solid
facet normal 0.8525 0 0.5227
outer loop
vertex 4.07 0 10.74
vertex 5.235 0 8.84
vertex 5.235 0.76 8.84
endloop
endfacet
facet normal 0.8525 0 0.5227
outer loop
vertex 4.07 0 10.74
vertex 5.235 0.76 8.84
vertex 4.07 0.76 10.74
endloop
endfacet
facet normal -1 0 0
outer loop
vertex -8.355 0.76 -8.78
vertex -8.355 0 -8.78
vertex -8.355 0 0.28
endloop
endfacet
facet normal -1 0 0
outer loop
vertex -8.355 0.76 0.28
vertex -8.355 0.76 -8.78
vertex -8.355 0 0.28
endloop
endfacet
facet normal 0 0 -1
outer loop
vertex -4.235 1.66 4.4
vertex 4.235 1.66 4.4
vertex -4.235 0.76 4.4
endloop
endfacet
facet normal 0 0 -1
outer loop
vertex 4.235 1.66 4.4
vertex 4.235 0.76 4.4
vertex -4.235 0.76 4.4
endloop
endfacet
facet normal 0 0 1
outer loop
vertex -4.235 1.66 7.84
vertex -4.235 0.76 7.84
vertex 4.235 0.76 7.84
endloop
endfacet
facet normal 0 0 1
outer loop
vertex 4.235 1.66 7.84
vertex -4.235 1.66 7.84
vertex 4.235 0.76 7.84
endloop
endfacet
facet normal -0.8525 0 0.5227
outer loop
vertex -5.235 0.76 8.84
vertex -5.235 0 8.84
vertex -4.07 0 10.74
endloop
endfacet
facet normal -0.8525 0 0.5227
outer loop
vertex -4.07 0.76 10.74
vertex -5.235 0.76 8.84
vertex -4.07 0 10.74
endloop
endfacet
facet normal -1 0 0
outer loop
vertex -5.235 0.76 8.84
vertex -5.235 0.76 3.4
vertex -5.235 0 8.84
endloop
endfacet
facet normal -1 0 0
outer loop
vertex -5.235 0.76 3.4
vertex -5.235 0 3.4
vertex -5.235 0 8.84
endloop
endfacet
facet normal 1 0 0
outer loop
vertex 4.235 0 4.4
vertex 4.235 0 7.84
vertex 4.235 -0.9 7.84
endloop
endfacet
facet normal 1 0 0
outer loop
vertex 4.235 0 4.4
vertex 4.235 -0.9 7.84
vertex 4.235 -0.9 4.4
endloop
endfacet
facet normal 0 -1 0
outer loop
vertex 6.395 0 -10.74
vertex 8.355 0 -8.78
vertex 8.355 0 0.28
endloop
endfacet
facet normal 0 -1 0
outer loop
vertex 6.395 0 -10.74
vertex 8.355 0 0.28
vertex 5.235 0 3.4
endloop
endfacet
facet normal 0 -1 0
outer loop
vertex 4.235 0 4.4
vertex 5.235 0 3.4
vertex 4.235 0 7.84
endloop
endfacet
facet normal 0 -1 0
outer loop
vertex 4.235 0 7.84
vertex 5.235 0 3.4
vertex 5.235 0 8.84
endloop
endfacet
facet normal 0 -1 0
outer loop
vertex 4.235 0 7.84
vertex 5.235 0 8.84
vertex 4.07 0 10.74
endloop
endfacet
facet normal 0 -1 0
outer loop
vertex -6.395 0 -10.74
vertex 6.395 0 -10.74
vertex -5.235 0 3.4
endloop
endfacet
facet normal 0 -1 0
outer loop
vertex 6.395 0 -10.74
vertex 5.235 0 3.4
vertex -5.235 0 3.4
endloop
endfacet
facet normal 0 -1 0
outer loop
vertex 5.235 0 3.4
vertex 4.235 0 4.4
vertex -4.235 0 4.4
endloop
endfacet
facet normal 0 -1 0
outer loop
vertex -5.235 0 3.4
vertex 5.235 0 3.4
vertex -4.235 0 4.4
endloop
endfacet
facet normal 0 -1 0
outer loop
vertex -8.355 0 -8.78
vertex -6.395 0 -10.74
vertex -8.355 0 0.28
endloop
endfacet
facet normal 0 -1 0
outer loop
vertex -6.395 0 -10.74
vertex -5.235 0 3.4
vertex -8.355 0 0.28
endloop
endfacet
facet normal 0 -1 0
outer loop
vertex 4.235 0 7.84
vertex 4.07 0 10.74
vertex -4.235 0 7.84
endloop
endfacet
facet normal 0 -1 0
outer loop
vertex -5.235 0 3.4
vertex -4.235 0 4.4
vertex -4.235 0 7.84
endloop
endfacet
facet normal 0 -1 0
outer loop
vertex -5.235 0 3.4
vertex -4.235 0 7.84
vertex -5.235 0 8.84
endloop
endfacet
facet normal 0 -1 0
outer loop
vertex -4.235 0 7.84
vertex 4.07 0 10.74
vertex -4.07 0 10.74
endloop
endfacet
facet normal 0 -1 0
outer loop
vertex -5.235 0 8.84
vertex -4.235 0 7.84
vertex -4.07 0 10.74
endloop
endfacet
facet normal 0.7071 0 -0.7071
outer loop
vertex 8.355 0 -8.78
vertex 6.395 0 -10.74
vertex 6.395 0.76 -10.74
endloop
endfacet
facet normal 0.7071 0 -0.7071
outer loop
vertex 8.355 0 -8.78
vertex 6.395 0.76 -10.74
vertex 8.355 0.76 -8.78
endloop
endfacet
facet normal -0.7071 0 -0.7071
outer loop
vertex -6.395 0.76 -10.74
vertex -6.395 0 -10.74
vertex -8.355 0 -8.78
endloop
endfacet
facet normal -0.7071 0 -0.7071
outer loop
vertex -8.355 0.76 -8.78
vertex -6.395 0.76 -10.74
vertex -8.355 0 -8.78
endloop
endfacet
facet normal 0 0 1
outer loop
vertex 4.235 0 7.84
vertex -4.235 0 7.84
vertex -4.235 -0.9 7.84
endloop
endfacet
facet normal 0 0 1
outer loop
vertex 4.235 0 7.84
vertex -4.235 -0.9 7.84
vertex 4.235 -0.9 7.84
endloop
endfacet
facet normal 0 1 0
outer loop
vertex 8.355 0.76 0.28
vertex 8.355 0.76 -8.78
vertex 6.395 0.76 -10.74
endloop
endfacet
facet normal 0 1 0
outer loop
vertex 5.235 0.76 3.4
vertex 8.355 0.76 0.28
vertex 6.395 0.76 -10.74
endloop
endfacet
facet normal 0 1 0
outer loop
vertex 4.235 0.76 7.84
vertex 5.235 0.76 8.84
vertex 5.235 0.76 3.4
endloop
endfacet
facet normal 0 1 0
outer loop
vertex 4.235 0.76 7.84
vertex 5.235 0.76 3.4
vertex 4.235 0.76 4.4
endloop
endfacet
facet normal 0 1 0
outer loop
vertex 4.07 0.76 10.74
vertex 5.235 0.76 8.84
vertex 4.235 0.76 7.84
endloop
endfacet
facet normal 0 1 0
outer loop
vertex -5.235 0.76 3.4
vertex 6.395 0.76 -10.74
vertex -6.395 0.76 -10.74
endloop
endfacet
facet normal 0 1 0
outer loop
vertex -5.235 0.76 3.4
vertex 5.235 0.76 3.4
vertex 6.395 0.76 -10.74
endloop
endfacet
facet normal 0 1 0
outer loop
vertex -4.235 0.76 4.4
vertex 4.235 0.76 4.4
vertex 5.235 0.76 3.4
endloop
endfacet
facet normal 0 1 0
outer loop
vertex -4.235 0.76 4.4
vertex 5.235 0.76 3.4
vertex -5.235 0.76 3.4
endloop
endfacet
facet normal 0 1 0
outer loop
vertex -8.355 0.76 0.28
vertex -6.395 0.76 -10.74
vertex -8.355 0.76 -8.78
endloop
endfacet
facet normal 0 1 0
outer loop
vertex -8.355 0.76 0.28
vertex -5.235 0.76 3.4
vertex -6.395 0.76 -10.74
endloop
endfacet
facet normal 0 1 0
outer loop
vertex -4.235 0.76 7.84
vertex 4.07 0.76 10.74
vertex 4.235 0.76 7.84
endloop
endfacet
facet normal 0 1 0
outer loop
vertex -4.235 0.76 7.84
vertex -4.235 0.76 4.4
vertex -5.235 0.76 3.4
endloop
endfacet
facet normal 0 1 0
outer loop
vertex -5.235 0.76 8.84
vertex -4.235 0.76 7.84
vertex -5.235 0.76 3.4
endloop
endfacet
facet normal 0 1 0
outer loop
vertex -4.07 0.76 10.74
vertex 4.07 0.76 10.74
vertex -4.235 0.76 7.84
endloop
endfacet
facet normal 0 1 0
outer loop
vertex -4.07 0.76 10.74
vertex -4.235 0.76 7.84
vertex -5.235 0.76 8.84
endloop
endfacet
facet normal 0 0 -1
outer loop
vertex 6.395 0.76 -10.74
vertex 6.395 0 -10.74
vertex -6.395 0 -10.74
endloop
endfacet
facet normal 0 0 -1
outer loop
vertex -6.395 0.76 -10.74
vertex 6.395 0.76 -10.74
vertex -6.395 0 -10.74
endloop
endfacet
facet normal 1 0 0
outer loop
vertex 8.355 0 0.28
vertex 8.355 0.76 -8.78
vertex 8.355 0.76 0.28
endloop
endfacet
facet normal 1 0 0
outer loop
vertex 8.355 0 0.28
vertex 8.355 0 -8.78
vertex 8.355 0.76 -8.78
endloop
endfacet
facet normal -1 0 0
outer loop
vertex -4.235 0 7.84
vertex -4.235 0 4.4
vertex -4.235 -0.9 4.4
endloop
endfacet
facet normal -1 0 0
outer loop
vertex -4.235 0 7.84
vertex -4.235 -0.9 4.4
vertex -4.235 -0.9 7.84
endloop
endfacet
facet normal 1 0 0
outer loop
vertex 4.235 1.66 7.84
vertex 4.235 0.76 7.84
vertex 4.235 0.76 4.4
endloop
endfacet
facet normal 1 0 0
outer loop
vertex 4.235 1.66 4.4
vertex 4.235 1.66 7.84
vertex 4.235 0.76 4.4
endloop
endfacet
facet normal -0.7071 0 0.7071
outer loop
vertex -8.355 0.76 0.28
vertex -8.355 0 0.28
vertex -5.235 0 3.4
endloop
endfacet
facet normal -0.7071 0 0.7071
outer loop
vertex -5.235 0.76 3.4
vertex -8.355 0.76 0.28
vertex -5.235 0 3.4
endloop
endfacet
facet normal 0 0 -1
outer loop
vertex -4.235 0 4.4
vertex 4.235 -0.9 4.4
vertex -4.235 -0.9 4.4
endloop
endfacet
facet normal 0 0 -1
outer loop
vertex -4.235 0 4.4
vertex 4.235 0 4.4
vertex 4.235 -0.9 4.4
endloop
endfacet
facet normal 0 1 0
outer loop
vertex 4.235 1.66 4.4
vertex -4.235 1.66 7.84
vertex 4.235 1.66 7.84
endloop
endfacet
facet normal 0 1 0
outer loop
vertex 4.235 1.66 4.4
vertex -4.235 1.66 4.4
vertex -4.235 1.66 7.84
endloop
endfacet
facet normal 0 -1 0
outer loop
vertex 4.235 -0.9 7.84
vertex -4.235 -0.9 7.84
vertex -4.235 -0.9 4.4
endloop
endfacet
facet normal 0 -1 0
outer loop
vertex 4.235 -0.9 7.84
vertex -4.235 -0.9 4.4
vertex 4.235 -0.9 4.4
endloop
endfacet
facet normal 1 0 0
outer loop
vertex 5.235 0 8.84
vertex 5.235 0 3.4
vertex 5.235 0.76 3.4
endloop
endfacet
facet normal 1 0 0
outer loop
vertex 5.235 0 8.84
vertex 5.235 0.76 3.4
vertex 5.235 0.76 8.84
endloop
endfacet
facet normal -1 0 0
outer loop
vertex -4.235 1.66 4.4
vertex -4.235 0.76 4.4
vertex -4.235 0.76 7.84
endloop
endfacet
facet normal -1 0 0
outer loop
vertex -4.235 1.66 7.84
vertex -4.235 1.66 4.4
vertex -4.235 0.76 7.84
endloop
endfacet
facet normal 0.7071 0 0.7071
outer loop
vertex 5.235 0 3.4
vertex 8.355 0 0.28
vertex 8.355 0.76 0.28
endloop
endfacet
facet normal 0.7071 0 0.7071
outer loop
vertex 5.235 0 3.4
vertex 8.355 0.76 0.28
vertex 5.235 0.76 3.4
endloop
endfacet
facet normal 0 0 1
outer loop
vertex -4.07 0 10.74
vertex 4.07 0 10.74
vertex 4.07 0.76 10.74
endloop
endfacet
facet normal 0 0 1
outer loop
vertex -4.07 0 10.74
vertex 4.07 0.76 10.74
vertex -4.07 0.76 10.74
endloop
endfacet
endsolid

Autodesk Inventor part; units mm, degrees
ref_plane "YZ Plane" through (0, 0, 0) normal (1, 0, 0) x (0, 1, 0)
ref_plane "XZ Plane" through (0, 0, 0) normal (0, 1, 0) x (-1, 0, 0)
ref_plane "XY Plane" through (0, 0, 0) normal (0, 0, 1) x (1, 0, 0)
sketch "Sketch1" plane through (0, 0, 0) normal (0, 1, 0) x (-1, 0, 0)
  line L0 (-6.395, -10.74) -> (6.395, -10.74)
  line L1 (6.395, -10.74) -> (8.355, -8.78)
  line L2 (8.355, -8.78) -> (8.355, 0.28)
  line L3 (8.355, 0.28) -> (5.235, 3.4)
  line L4 (5.235, 3.4) -> (5.235, 8.84)
  line L5 (5.235, 8.84) -> (4.07, 10.74)
  line L6 (-6.395, -10.74) -> (-8.355, -8.78)
  line L7 (-8.355, -8.78) -> (-8.355, 0.28)
  line L8 (-8.355, 0.28) -> (-5.235, 3.4)
  line L9 (-5.235, 3.4) -> (-5.235, 8.84)
  line L10 (-5.235, 8.84) -> (-4.07, 10.74)
  line L11 (-4.07, 10.74) -> (4.07, 10.74)
  dimension "d0" = 12.79
extrude "Extrusion1" add sketch "Sketch1" along normal blind 0.76
sketch "Sketch2" plane through (0, 0.76, 0) normal (0, 1, 0) x (1, 0, 0)
  line L0 (-5.235, -3.4) -> (5.235, -3.4) construction
  line L1 (5.235, -3.4) -> (5.235, -8.84) construction
  line L2 (5.235, -8.84) -> (-5.235, -8.84) construction
  line L3 (-5.235, -8.84) -> (-5.235, -3.4) construction
  line L4 (4.235, -4.4) -> (-4.235, -4.4)
  line L5 (-4.235, -4.4) -> (-4.235, -7.84)
  line L6 (-4.235, -7.84) -> (4.235, -7.84)
  line L7 (4.235, -7.84) -> (4.235, -4.4)
  point P0 (0, 0)
  dimension "d4" = 1
extrude "Extrusion2" add sketch "Sketch2" along normal blind 0.9
sketch "Sketch3" plane through (0, 0, 0) normal (0, -1, 0) x (1, 0, 0)
  line L0 (4.235, 4.4) -> (-4.235, 4.4) projected
  line L1 (-4.235, 4.4) -> (-4.235, 7.84) projected
  line L2 (-4.235, 7.84) -> (4.235, 7.84) projected
  line L3 (4.235, 7.84) -> (4.235, 4.4) projected
  point P0 (0, 0)
extrude "Extrusion3" add sketch "Sketch3" along normal blind 0.9
properties part number "WirebondAdapter"
